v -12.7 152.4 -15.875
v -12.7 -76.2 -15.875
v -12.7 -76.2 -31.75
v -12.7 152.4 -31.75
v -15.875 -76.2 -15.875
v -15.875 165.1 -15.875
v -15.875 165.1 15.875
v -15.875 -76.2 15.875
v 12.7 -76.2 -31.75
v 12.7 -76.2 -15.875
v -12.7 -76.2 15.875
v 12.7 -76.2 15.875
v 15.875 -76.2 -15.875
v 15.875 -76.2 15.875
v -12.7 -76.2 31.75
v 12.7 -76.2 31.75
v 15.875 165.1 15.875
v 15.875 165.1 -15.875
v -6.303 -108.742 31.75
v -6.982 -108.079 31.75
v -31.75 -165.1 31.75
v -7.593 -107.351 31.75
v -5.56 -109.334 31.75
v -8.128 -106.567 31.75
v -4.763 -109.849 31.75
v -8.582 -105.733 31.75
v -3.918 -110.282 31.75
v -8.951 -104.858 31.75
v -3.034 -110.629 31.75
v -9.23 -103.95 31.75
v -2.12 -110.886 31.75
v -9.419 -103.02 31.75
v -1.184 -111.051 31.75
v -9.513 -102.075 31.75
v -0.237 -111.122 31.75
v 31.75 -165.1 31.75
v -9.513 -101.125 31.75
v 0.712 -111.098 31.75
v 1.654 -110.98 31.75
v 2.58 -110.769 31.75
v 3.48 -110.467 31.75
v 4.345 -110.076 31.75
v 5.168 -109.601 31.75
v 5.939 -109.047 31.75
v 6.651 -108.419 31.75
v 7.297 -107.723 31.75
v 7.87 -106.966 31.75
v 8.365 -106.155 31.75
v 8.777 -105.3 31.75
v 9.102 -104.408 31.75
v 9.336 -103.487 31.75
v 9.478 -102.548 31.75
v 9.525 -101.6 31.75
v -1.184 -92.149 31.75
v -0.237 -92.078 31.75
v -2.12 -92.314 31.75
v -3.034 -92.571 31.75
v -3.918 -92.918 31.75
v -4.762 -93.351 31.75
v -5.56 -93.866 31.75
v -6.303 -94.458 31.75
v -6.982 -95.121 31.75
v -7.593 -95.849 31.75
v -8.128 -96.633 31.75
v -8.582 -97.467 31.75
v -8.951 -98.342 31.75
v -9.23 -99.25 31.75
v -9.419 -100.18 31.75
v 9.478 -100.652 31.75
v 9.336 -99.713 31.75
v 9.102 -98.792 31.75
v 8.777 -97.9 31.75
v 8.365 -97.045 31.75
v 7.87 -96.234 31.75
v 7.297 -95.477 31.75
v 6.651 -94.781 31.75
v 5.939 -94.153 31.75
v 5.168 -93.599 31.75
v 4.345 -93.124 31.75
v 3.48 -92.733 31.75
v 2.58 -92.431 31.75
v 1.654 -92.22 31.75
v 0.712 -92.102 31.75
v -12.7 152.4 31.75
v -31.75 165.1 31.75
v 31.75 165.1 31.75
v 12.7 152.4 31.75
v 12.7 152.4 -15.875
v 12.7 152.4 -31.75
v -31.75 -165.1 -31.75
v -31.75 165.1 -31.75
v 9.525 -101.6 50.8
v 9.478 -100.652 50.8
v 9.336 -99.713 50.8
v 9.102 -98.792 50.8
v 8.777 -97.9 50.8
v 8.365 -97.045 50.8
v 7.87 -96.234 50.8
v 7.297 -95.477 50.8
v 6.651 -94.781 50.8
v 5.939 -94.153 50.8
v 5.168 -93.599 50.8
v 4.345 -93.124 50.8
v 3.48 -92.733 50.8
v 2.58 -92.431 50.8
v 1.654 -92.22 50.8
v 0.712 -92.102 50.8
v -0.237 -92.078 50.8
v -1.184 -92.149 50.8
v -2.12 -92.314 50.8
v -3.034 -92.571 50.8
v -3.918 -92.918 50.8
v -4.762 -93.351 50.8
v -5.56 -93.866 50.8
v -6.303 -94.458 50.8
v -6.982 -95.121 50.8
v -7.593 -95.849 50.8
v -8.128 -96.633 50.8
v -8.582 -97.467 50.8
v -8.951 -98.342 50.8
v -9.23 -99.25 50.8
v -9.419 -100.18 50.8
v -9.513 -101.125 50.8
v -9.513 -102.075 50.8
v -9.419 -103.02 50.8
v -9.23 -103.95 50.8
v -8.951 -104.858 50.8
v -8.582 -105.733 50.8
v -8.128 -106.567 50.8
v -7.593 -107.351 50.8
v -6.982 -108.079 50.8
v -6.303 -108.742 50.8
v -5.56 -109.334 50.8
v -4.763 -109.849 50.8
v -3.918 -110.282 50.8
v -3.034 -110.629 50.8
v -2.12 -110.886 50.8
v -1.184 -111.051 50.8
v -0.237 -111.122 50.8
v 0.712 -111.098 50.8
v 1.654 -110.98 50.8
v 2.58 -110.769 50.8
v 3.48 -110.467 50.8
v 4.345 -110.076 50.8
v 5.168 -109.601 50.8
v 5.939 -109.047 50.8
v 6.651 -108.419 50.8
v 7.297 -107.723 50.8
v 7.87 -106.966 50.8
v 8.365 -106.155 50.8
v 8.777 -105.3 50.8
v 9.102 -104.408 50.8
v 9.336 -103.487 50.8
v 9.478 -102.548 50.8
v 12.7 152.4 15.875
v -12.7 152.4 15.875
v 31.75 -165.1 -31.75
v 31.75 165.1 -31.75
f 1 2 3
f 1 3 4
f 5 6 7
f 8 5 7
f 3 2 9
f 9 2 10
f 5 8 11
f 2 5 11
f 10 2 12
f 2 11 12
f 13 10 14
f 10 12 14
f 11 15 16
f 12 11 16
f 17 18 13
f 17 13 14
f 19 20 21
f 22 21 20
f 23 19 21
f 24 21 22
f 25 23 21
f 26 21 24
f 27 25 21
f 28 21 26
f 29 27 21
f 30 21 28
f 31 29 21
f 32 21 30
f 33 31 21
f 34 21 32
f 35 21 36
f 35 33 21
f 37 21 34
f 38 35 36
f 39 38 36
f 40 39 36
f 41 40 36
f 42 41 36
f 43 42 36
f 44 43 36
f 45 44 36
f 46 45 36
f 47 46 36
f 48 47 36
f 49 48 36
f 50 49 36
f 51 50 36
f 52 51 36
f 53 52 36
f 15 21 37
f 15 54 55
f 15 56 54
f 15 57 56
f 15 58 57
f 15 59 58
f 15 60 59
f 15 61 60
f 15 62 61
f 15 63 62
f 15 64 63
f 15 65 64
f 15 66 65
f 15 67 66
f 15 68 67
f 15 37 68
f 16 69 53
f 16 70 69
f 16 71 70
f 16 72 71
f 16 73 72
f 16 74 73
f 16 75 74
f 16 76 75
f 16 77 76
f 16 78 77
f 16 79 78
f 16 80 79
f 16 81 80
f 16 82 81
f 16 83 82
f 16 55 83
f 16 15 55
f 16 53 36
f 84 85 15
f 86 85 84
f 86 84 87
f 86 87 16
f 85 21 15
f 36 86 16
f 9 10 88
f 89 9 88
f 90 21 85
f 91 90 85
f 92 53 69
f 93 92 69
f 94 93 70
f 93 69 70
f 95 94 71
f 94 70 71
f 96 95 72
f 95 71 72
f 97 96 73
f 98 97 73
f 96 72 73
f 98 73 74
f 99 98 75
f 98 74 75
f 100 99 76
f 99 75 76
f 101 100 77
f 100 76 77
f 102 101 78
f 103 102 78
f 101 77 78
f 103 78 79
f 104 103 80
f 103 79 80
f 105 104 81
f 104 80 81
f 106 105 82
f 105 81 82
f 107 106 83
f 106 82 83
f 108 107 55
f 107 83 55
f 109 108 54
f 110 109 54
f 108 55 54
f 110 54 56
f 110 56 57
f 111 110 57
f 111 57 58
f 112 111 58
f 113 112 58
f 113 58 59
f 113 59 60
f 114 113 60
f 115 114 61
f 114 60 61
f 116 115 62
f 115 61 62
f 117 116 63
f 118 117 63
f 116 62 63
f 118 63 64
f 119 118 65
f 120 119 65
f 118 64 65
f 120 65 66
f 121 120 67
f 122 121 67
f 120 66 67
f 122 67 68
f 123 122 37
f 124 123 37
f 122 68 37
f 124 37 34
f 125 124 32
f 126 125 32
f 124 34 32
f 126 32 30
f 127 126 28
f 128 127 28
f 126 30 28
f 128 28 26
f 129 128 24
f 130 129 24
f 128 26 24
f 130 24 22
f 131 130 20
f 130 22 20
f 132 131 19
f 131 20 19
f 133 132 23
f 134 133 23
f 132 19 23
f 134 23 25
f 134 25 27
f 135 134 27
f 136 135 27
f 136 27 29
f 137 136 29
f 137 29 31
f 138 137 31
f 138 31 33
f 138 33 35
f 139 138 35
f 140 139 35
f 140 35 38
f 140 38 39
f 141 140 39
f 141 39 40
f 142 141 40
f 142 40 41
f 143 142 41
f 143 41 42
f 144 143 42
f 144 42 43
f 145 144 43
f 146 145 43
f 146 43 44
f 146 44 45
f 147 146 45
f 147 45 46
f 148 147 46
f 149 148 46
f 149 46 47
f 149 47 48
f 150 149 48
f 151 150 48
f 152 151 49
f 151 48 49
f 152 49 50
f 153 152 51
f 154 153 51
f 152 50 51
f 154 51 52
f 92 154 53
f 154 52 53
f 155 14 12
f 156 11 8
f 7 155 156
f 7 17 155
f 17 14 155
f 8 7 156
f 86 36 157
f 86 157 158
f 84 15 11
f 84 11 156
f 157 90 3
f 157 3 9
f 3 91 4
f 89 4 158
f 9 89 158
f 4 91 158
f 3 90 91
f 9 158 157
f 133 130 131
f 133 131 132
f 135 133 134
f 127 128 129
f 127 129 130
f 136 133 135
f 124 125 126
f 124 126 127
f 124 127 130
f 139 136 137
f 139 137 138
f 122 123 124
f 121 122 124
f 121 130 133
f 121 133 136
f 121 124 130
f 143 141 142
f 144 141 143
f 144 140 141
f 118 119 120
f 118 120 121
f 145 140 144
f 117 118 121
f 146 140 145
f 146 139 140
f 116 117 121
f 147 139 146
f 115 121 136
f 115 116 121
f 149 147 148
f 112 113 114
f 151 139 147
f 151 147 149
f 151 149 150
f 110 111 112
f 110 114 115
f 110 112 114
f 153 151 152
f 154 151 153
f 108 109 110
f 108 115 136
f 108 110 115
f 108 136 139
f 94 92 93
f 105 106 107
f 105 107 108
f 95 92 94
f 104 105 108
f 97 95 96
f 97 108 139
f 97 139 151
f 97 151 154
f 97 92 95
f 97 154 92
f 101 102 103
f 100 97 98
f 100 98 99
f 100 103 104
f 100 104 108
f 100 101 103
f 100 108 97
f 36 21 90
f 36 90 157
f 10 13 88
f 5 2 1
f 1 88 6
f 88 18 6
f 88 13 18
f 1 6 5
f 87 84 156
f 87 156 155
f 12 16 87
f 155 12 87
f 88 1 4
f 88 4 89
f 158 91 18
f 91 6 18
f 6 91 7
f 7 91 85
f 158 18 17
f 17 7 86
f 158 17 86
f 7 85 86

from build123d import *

# Parameters (mm, degrees)
F0_W     = 63.5
F0_H     = 330.2
F0_W_2   = 25.4
F0_H_2   = 228.6
F1_DEPTH = 31.75
F2_W     = 31.75
F2_H     = 31.75
F3_DEPTH = 241.3
F4_R     = 9.525
F5_DEPTH = 19.05


with BuildPart() as f1:
    # F0 (on Top) → F1 (new body, symmetric)
    with BuildSketch(Plane.XY):
        Rectangle(F0_W, F0_H)
        with Locations((0, 38.1)):
            Rectangle(F0_W_2, F0_H_2, mode=Mode.SUBTRACT)
    extrude(amount=F1_DEPTH, both=True)

    # F2 (on face) → F3 (cut)
    with BuildSketch(Plane(origin=(0, 165.1, 0), x_dir=(-1, 0, 0), z_dir=(0, 1, 0))):
        Rectangle(F2_W, F2_H)
    extrude(amount=-F3_DEPTH, mode=Mode.SUBTRACT)

    # F4 (on face) → F5 (join)
    with BuildSketch(Plane.XY.offset(31.75)):
        with Locations((0, -101.6)):
            Circle(F4_R)
    extrude(amount=F5_DEPTH)


solid = f1.part
